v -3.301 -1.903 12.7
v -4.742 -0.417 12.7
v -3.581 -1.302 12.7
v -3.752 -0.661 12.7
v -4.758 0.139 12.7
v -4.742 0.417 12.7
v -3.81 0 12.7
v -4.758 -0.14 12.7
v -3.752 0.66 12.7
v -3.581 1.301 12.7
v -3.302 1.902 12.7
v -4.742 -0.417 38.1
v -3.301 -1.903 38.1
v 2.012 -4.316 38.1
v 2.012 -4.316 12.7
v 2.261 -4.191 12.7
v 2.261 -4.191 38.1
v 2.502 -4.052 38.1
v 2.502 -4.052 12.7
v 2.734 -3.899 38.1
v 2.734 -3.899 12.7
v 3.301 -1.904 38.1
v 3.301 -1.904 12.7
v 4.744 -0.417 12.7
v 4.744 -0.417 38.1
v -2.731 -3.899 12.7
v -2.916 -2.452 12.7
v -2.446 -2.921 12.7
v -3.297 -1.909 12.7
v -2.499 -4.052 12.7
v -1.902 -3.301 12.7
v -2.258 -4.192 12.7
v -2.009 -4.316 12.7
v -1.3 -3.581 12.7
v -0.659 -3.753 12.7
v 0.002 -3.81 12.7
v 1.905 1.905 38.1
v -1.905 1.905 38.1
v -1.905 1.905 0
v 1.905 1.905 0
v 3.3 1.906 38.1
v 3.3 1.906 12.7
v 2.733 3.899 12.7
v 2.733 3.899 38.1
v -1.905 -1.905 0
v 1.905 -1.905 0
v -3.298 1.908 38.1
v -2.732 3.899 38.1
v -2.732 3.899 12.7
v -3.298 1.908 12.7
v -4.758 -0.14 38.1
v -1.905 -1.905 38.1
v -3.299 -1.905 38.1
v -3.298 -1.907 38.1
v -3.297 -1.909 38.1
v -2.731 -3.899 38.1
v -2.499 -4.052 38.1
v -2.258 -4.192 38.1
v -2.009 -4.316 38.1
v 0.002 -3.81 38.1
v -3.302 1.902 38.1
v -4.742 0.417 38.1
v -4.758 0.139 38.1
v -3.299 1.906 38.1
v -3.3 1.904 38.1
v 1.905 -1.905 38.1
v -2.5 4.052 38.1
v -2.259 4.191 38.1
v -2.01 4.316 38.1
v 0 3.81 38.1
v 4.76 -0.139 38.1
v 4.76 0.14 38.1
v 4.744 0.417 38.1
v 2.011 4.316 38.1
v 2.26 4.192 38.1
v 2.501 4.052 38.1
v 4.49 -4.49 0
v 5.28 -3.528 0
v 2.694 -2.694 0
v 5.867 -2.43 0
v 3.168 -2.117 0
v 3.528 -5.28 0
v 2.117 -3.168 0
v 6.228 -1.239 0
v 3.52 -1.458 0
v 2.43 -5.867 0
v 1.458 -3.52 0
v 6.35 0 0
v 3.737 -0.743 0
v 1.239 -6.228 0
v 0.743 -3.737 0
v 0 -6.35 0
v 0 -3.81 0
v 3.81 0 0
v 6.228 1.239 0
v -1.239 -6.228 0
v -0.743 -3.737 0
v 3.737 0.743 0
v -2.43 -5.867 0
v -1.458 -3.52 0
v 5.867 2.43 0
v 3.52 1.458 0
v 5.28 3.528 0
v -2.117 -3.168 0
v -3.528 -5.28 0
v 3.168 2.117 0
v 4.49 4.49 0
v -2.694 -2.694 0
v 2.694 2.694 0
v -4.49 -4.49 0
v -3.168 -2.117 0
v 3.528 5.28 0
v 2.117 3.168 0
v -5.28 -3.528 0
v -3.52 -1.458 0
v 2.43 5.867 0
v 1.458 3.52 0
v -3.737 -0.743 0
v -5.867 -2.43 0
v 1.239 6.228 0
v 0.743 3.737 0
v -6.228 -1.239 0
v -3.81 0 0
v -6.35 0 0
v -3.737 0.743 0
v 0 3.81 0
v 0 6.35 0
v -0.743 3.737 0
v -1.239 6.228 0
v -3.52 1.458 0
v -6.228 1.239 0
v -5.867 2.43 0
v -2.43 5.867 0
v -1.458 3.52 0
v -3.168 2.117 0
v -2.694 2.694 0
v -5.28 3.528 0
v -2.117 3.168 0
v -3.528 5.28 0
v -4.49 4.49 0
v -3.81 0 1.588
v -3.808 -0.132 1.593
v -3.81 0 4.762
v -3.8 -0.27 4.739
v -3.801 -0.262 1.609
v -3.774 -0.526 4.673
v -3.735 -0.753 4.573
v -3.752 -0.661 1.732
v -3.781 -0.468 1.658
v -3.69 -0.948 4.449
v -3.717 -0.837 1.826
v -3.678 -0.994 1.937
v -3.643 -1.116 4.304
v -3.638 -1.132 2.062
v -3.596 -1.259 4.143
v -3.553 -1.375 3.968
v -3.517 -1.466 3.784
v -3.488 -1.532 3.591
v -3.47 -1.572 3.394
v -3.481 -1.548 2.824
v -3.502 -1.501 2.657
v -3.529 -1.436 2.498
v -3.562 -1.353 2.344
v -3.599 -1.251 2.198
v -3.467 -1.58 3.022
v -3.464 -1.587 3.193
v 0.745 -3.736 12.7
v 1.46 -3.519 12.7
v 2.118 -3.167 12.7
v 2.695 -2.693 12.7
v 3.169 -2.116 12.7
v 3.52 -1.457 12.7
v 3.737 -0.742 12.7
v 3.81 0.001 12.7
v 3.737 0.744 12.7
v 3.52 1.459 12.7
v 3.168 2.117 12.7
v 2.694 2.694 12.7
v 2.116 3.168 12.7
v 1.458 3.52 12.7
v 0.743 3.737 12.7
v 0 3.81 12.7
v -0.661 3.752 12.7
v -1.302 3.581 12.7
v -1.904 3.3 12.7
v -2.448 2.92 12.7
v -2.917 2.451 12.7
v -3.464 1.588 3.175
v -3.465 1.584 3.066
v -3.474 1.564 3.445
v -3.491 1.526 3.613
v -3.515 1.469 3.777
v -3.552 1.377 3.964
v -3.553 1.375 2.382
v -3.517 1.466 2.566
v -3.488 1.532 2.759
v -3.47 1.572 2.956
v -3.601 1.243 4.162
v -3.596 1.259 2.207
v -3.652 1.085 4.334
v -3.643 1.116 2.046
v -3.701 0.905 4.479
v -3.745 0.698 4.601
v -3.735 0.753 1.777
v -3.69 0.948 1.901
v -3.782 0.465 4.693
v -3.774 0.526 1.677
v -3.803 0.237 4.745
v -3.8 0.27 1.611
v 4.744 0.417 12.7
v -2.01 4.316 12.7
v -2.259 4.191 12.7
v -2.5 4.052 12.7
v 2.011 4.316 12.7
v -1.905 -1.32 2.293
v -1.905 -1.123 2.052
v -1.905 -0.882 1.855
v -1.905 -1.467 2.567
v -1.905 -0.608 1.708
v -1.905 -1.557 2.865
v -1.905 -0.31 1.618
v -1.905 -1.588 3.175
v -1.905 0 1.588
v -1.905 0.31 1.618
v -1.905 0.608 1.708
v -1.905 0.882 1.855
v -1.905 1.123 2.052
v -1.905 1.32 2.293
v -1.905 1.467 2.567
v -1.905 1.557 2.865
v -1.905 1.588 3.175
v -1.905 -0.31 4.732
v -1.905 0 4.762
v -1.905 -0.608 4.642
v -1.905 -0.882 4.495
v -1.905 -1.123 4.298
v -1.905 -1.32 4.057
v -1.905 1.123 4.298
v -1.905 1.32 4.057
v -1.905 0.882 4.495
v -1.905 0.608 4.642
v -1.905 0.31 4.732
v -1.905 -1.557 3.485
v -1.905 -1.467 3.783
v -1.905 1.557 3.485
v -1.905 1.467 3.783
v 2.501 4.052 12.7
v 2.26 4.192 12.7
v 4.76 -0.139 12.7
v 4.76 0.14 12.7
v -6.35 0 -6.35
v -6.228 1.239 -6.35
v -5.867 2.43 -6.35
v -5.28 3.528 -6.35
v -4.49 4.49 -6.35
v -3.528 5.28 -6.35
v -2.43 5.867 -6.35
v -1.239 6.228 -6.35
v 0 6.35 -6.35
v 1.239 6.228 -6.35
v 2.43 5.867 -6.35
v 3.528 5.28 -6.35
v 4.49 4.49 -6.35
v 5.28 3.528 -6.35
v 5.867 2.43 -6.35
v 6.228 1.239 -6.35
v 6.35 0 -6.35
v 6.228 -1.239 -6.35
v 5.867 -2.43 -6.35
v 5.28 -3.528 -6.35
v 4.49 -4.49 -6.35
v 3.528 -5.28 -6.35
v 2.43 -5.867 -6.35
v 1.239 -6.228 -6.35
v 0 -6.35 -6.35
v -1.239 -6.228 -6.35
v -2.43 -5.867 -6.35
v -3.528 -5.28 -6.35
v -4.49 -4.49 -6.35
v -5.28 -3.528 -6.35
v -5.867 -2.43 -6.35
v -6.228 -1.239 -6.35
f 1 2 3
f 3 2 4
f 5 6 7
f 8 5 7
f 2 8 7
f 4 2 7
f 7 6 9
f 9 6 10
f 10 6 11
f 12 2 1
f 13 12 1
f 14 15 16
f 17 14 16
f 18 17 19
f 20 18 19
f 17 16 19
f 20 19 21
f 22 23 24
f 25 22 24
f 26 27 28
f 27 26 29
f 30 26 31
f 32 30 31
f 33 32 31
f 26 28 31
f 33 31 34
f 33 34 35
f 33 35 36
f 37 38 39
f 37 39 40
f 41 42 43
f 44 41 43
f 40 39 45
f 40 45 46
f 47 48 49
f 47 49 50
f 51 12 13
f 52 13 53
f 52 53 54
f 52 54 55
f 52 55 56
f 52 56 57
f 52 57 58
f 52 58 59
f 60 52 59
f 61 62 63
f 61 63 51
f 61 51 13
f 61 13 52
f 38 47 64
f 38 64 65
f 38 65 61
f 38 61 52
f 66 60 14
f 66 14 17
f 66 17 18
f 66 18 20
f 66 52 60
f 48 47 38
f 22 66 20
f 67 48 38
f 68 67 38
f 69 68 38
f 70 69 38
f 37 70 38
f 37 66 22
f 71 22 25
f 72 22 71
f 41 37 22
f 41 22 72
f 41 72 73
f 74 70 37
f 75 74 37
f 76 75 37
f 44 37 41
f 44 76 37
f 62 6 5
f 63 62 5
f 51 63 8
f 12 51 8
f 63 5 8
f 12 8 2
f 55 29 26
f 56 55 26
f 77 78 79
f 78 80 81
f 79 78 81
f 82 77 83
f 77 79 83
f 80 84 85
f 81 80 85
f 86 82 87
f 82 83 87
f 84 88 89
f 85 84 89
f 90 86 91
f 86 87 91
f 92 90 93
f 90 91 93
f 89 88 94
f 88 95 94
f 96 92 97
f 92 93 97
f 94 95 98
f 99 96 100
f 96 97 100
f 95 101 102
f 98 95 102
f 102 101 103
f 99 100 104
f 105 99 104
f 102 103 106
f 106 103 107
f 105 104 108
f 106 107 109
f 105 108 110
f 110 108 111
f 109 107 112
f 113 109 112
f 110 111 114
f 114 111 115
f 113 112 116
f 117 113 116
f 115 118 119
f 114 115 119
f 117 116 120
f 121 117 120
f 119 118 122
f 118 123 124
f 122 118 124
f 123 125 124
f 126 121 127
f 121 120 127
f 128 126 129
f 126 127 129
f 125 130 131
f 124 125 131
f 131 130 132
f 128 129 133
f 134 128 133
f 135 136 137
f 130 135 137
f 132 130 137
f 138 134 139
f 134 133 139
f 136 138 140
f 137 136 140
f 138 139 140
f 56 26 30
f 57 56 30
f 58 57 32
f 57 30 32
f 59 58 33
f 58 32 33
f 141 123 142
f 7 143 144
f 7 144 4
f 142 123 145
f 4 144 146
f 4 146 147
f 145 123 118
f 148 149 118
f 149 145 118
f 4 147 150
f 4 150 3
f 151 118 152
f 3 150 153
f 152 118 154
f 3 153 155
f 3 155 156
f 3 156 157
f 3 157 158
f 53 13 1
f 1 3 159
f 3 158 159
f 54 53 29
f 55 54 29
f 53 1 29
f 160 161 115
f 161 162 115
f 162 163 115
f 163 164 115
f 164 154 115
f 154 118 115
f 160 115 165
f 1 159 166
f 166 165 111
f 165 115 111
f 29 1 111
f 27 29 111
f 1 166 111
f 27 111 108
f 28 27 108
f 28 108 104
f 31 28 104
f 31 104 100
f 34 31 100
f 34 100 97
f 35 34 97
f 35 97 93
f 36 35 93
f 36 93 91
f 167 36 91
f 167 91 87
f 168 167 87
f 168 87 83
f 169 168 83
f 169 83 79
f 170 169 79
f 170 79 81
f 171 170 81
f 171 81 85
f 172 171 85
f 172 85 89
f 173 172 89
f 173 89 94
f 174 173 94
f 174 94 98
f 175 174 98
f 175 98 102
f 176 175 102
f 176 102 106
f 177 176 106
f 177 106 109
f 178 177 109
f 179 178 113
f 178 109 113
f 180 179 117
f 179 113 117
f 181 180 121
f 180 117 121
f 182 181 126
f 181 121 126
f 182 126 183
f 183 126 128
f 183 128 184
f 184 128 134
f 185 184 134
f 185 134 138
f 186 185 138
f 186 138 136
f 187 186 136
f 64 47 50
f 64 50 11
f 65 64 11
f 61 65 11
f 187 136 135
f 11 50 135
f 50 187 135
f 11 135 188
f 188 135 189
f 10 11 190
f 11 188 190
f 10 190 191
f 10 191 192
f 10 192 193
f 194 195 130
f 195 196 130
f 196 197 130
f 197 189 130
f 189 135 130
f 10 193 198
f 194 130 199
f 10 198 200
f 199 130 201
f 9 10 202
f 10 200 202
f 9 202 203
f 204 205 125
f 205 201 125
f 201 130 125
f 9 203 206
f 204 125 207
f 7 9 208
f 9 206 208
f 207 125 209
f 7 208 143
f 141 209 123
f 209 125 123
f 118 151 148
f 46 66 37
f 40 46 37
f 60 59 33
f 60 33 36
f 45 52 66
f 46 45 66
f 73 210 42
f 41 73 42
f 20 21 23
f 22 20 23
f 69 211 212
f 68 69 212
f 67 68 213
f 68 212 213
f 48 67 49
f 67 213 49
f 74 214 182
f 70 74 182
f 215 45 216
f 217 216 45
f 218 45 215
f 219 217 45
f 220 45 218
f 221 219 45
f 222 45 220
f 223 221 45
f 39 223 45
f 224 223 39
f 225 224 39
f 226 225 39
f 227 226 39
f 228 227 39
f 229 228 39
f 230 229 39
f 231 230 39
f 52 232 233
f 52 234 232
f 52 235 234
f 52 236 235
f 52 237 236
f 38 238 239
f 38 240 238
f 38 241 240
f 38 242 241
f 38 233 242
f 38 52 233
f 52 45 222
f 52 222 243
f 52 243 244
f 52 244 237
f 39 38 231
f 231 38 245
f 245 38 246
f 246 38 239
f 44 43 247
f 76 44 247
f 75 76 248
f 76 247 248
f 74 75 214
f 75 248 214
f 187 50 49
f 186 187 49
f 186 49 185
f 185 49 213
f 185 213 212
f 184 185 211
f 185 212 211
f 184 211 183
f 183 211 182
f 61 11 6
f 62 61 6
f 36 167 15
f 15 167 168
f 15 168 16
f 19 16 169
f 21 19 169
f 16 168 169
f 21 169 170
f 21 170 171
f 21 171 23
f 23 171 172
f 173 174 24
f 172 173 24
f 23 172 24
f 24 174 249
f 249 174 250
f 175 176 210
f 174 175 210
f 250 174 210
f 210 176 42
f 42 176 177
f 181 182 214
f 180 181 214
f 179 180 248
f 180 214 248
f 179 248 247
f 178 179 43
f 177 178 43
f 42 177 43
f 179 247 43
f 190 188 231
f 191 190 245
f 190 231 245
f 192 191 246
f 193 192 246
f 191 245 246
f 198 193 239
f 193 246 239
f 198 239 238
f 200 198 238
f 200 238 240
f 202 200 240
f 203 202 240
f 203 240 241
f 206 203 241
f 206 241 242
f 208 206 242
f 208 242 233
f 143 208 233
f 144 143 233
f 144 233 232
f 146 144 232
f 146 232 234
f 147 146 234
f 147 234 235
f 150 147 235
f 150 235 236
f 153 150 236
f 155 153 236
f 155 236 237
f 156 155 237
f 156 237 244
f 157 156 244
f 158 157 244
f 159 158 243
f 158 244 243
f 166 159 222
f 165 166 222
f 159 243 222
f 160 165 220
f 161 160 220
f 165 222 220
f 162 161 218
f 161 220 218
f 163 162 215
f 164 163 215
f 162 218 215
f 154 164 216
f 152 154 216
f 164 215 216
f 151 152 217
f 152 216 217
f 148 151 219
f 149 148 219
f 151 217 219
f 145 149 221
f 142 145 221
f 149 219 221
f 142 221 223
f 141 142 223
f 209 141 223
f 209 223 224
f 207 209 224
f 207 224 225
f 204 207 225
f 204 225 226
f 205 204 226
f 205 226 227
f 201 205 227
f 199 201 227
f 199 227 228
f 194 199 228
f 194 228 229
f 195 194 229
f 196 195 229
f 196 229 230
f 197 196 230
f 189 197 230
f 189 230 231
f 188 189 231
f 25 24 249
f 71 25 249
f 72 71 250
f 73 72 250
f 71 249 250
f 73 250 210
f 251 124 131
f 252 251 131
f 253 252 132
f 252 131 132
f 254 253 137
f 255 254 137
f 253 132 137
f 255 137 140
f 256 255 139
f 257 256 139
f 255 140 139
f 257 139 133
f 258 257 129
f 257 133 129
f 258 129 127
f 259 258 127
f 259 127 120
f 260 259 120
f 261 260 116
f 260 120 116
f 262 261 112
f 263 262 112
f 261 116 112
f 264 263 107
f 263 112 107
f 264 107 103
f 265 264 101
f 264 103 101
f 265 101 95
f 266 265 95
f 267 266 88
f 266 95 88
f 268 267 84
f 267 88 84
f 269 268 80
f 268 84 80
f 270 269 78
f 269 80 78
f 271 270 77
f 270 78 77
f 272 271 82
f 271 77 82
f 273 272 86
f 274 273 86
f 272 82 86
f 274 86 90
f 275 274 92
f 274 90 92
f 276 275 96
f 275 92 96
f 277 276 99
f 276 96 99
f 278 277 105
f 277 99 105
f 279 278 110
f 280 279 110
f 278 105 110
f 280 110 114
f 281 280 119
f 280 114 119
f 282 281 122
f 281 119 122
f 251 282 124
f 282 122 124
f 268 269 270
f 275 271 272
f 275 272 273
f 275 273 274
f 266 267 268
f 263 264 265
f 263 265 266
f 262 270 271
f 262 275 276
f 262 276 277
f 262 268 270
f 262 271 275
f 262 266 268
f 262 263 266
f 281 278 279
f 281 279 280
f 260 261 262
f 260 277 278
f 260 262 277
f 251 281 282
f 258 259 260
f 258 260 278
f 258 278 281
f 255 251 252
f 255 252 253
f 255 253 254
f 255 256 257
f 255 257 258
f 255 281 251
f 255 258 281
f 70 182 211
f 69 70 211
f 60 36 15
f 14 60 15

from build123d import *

# Parameters (mm, degrees)
SKETCH1_R           = 3.81
BOSS_EXTRUDE1_DEPTH = 38.1
SKETCH2_R           = 6.35
BOSS_EXTRUDE2_DEPTH = 6.35
SKETCH6_R           = 2.8575
BOSS_EXTRUDE3_DEPTH = 2.54
SKETCH14_W          = 3.81
SKETCH14_H          = 3.81
CUT_EXTRUDE1_DEPTH  = 38.1
BOSS_EXTRUDE5_START = -25.4
BOSS_EXTRUDE5_DEPTH = 25.4
SKETCH16_R          = 1.5875
CUT_EXTRUDE2_DEPTH  = 25.4


# Read off the part's stored shape, not the designer's step: Boss-Extrude5
with BuildPart() as part:
    # Sketch1 → Boss-Extrude1 (new body)
    with BuildSketch(Plane.XY):
        with Locations(Location((0, 0, 0), (0, 0, 180))):
            Circle(SKETCH1_R)
    extrude(amount=BOSS_EXTRUDE1_DEPTH)

    # Sketch2 → Boss-Extrude2 (add)
    with BuildSketch(Plane(origin=(0, 0, 0), x_dir=(-1, 0, 0), z_dir=(0, 0, -1))):
        Circle(SKETCH2_R)
    extrude(amount=BOSS_EXTRUDE2_DEPTH)

    # Sketch6 → Boss-Extrude3 (add)
    with BuildSketch(Plane.XY.offset(38.1)):
        Circle(SKETCH6_R)
    extrude(amount=-BOSS_EXTRUDE3_DEPTH)

    # Sketch14 → Cut-Extrude1 (cut)
    with BuildSketch(Plane.XY.offset(38.1)):
        Rectangle(SKETCH14_W, SKETCH14_H)
    extrude(amount=-CUT_EXTRUDE1_DEPTH, mode=Mode.SUBTRACT)

    # Boss-Extrude5 outline → Boss-Extrude5 (add)
    with BuildSketch(Plane.XY.offset(38.1).offset(BOSS_EXTRUDE5_START)):
        with BuildLine():
            ThreePointArc((-3.298088459, 1.907540961), (-1.903729096, 3.300290219), (0, 3.81))
            Line((0, 3.81), (-2.010168305, 4.316182263))
            ThreePointArc((-2.010168305, 4.316182263), (-2.380206411, 4.123596348), (-2.731973317, 3.899369726))
            Line((-2.731973317, 3.899369726), (-3.298088459, 1.907540961))
        make_face()
        with BuildLine():
            Line((2.011093908, 4.31641534), (0, 3.81))
            ThreePointArc((0, 3.81), (3.809999869, 0.001000002), (0.002000005, -3.809999475))
            Line((0.002000005, -3.809999475), (2.011795704, -4.316088438))
            ThreePointArc((2.011795704, -4.316088438), (2.38208523, -4.123386397), (2.734078384, -3.899000058))
            Line((2.734078384, -3.899000058), (3.301056788, -1.904133975))
            Line((3.301056788, -1.904133975), (4.744240085, -0.416644057))
            ThreePointArc((4.744240085, -0.416644057), (4.762499984, 0.000387099), (4.744172292, 0.417415282))
            Line((4.744172292, 0.417415282), (3.300056788, 1.905866025))
            Line((3.300056788, 1.905866025), (2.73344438, 3.899444381))
            ThreePointArc((2.73344438, 3.899444381), (2.381414754, 4.123773496), (2.011093908, 4.31641534))
        make_face()
        with BuildLine():
            Line((-2.009093908, -4.31641534), (0.002000005, -3.809999475))
            ThreePointArc((0.002000005, -3.809999475), (-1.901999931, -3.301287062), (-3.29709076, -1.909264917))
            Line((-3.29709076, -1.909264917), (-2.73144438, -3.899444381))
            ThreePointArc((-2.73144438, -3.899444381), (-2.379414754, -4.123773496), (-2.009093908, -4.31641534))
        make_face()
        with BuildLine():
            ThreePointArc((-3.300524979, -1.90332206), (-3.80999987, -0.000996951), (-3.3015206, 1.901594523))
            Line((-3.3015206, 1.901594523), (-4.742240085, 0.416644057))
            ThreePointArc((-4.742240085, 0.416644057), (-4.760499984, -0.000387099), (-4.742172292, -0.417415282))
            Line((-4.742172292, -0.417415282), (-3.300524979, -1.90332206))
        make_face()
    extrude(amount=BOSS_EXTRUDE5_DEPTH)

    # Sketch16 → Cut-Extrude2 (cut)
    with BuildSketch(Plane(origin=(-1.905, 0, 0), x_dir=(0, 0, -1), z_dir=(1, 0, 0))):
        with Locations(Location((-3.175, 0, 0), (0, 0, 90))):
            Circle(SKETCH16_R)
    extrude(amount=-CUT_EXTRUDE2_DEPTH, mode=Mode.SUBTRACT)


solid = part.part
